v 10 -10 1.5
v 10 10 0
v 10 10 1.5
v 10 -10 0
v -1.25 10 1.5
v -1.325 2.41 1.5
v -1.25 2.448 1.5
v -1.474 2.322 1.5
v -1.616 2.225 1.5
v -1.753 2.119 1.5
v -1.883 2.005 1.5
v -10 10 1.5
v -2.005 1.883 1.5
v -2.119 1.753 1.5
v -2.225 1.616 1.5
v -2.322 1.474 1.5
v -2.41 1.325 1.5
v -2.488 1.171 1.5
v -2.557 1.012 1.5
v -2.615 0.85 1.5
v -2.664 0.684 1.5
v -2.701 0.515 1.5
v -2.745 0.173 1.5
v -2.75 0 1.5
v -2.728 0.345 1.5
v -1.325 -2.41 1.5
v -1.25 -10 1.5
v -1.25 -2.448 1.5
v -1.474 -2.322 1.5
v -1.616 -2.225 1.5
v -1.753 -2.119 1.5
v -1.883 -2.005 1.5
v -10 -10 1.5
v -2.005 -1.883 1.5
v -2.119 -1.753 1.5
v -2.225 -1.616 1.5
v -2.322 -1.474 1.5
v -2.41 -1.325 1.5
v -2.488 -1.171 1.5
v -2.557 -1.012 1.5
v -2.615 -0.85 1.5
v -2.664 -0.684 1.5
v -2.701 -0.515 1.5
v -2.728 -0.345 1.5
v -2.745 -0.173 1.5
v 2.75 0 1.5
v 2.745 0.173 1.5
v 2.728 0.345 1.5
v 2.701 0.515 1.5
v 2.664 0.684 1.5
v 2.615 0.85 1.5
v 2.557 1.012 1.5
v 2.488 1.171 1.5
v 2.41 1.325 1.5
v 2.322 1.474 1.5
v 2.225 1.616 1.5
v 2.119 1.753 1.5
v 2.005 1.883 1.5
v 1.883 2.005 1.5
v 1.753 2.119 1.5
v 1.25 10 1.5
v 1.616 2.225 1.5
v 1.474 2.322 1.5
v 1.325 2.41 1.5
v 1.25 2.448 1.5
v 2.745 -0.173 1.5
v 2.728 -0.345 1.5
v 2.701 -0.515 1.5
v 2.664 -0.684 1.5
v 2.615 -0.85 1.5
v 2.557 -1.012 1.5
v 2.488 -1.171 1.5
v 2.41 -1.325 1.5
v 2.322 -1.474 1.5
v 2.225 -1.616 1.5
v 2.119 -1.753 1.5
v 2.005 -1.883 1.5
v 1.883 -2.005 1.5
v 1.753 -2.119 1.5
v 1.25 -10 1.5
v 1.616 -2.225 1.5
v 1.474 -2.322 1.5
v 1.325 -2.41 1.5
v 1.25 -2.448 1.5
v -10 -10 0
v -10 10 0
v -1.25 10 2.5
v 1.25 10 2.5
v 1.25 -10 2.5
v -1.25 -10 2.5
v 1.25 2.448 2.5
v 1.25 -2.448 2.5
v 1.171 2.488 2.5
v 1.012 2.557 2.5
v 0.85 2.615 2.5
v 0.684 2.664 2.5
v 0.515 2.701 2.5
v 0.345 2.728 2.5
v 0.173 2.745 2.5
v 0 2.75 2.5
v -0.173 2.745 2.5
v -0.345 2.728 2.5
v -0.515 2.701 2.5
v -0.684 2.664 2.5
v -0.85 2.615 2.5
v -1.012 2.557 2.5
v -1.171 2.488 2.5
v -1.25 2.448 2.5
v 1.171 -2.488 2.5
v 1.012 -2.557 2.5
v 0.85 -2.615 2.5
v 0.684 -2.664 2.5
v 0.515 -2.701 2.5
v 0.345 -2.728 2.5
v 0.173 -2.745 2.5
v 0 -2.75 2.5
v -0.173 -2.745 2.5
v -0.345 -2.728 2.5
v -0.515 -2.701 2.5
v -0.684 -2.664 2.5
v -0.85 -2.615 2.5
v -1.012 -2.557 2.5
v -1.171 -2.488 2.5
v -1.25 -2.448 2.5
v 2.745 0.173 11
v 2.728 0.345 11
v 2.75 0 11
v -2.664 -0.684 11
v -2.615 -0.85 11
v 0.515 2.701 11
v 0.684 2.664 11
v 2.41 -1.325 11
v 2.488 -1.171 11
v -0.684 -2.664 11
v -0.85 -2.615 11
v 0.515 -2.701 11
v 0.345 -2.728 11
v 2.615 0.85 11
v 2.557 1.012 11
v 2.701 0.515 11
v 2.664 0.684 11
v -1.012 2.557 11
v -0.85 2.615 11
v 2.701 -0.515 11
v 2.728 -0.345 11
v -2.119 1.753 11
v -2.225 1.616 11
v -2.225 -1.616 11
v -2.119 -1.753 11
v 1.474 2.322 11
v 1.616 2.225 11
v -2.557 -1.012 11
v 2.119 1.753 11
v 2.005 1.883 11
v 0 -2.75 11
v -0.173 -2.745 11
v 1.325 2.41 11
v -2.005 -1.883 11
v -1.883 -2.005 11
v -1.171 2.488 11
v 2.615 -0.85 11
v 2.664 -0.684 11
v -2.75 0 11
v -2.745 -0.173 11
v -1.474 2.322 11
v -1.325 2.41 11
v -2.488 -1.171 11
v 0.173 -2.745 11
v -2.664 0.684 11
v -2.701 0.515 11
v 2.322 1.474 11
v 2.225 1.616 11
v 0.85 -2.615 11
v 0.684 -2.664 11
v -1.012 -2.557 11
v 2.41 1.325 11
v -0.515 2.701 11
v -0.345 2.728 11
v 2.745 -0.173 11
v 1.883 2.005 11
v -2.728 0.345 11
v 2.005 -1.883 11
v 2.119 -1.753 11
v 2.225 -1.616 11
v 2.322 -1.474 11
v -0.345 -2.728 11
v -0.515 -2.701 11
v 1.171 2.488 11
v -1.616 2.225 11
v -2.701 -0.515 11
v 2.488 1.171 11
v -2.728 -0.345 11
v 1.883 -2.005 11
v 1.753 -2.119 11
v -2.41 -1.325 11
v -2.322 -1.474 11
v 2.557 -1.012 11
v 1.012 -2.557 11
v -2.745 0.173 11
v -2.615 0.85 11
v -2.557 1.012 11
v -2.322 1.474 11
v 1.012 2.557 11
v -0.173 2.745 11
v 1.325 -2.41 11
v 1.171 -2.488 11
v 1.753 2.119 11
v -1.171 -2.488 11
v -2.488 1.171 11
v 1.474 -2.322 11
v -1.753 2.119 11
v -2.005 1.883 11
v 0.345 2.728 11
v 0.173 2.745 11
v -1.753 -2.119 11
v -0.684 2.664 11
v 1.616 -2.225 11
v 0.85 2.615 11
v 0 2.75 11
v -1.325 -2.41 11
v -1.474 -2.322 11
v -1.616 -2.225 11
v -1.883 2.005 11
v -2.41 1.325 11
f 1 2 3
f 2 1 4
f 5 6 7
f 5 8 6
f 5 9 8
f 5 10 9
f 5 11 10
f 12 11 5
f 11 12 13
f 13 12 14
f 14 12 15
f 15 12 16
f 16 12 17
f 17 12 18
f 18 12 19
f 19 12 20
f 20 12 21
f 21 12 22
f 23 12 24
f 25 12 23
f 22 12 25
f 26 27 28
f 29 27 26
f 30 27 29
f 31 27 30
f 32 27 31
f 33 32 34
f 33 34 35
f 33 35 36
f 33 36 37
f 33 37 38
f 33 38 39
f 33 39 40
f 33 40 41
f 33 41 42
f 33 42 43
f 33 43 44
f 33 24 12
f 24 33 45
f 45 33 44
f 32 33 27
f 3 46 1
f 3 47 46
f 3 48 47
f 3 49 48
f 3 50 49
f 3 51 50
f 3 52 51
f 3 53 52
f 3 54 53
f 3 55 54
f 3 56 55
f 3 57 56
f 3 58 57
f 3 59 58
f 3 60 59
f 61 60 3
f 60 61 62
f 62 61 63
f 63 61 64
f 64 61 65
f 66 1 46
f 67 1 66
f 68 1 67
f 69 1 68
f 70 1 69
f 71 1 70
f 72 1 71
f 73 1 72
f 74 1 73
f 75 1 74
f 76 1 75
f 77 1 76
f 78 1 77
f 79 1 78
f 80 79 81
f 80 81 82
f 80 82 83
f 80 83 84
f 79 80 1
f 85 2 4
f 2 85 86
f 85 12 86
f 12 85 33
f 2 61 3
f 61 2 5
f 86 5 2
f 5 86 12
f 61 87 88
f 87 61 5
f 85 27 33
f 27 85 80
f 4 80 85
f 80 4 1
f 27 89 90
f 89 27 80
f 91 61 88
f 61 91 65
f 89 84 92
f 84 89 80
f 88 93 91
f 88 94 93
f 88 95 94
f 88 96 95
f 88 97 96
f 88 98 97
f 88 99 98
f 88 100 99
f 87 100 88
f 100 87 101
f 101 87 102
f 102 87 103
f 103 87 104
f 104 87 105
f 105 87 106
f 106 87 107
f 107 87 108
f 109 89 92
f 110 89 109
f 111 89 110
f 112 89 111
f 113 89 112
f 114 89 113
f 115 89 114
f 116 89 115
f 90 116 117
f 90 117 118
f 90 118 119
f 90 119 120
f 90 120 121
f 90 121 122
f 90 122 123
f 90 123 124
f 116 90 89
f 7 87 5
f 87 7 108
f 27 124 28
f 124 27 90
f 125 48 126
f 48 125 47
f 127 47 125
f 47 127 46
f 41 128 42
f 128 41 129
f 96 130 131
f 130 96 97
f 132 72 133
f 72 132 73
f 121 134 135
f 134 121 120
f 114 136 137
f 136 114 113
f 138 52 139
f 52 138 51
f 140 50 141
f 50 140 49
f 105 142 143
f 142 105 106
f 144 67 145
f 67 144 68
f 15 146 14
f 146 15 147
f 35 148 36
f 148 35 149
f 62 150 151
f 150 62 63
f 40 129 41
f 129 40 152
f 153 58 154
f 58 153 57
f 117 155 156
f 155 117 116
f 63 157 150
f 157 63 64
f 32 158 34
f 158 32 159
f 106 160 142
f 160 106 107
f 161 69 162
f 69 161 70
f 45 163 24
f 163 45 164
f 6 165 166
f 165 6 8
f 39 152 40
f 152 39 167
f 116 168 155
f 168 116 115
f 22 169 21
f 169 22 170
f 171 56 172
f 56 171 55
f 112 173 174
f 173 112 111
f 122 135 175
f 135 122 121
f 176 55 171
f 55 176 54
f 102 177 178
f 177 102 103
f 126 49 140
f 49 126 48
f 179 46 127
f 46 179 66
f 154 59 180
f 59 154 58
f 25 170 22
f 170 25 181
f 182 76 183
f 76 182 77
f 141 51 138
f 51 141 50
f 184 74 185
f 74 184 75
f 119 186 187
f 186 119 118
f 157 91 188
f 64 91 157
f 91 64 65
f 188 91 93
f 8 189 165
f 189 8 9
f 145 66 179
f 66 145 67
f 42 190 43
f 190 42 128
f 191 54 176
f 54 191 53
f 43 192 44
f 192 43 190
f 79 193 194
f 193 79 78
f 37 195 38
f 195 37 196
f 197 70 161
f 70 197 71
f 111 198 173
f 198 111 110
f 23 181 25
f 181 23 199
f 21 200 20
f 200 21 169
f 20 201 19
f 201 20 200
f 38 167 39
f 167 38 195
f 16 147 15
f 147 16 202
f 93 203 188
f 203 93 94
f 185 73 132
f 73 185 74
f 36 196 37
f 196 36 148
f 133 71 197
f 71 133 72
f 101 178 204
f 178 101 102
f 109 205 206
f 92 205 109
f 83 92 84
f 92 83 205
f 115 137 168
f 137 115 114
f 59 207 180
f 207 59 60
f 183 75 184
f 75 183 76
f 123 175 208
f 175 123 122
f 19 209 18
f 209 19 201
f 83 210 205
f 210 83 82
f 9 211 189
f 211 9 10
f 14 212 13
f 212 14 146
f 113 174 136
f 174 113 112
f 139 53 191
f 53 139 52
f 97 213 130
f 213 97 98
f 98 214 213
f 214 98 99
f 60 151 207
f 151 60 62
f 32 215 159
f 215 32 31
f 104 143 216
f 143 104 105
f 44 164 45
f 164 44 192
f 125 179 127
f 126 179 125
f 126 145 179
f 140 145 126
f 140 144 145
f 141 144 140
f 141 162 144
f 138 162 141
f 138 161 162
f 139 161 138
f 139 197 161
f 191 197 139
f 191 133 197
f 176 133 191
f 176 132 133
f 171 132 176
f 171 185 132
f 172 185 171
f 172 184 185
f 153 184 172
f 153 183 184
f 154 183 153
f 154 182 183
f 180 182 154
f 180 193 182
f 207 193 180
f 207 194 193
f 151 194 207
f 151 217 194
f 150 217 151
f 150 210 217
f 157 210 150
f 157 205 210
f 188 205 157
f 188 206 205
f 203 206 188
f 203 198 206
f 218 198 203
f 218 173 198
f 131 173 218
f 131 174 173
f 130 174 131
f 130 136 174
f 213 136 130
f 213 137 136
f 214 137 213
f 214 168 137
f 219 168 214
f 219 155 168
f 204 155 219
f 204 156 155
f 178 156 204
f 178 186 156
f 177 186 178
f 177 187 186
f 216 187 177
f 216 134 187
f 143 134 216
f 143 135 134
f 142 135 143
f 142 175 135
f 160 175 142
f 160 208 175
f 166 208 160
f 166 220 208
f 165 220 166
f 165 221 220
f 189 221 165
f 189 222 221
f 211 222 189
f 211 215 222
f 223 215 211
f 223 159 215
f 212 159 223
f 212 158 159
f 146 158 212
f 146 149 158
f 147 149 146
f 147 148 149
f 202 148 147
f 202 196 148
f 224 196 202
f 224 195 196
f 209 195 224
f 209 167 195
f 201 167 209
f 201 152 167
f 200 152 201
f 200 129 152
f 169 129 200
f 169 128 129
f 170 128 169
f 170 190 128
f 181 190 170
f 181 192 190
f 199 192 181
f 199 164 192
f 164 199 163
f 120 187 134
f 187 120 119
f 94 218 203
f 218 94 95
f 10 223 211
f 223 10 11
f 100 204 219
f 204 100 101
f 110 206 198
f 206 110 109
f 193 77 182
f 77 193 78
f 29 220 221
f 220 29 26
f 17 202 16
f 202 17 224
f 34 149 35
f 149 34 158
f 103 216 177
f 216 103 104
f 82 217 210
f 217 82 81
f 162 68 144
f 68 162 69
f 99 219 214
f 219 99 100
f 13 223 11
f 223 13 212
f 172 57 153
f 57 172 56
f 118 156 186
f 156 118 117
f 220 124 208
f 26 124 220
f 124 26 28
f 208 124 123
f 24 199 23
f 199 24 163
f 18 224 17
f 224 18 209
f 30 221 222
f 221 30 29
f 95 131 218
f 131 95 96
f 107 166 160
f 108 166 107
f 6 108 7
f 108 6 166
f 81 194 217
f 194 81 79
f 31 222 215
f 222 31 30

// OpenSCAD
// vim: ft=c

$fn=100;

module pin() {
	union () {
		translate([-10,-10,0])
			cube([20,20,1.5]);
		translate([-2.5/2,-10,0.5])
			cube([2.5,20,2]);
		translate([0,0,0.5])
			cylinder(h=10.5, r=5.5/2);
	}
}

pin();
